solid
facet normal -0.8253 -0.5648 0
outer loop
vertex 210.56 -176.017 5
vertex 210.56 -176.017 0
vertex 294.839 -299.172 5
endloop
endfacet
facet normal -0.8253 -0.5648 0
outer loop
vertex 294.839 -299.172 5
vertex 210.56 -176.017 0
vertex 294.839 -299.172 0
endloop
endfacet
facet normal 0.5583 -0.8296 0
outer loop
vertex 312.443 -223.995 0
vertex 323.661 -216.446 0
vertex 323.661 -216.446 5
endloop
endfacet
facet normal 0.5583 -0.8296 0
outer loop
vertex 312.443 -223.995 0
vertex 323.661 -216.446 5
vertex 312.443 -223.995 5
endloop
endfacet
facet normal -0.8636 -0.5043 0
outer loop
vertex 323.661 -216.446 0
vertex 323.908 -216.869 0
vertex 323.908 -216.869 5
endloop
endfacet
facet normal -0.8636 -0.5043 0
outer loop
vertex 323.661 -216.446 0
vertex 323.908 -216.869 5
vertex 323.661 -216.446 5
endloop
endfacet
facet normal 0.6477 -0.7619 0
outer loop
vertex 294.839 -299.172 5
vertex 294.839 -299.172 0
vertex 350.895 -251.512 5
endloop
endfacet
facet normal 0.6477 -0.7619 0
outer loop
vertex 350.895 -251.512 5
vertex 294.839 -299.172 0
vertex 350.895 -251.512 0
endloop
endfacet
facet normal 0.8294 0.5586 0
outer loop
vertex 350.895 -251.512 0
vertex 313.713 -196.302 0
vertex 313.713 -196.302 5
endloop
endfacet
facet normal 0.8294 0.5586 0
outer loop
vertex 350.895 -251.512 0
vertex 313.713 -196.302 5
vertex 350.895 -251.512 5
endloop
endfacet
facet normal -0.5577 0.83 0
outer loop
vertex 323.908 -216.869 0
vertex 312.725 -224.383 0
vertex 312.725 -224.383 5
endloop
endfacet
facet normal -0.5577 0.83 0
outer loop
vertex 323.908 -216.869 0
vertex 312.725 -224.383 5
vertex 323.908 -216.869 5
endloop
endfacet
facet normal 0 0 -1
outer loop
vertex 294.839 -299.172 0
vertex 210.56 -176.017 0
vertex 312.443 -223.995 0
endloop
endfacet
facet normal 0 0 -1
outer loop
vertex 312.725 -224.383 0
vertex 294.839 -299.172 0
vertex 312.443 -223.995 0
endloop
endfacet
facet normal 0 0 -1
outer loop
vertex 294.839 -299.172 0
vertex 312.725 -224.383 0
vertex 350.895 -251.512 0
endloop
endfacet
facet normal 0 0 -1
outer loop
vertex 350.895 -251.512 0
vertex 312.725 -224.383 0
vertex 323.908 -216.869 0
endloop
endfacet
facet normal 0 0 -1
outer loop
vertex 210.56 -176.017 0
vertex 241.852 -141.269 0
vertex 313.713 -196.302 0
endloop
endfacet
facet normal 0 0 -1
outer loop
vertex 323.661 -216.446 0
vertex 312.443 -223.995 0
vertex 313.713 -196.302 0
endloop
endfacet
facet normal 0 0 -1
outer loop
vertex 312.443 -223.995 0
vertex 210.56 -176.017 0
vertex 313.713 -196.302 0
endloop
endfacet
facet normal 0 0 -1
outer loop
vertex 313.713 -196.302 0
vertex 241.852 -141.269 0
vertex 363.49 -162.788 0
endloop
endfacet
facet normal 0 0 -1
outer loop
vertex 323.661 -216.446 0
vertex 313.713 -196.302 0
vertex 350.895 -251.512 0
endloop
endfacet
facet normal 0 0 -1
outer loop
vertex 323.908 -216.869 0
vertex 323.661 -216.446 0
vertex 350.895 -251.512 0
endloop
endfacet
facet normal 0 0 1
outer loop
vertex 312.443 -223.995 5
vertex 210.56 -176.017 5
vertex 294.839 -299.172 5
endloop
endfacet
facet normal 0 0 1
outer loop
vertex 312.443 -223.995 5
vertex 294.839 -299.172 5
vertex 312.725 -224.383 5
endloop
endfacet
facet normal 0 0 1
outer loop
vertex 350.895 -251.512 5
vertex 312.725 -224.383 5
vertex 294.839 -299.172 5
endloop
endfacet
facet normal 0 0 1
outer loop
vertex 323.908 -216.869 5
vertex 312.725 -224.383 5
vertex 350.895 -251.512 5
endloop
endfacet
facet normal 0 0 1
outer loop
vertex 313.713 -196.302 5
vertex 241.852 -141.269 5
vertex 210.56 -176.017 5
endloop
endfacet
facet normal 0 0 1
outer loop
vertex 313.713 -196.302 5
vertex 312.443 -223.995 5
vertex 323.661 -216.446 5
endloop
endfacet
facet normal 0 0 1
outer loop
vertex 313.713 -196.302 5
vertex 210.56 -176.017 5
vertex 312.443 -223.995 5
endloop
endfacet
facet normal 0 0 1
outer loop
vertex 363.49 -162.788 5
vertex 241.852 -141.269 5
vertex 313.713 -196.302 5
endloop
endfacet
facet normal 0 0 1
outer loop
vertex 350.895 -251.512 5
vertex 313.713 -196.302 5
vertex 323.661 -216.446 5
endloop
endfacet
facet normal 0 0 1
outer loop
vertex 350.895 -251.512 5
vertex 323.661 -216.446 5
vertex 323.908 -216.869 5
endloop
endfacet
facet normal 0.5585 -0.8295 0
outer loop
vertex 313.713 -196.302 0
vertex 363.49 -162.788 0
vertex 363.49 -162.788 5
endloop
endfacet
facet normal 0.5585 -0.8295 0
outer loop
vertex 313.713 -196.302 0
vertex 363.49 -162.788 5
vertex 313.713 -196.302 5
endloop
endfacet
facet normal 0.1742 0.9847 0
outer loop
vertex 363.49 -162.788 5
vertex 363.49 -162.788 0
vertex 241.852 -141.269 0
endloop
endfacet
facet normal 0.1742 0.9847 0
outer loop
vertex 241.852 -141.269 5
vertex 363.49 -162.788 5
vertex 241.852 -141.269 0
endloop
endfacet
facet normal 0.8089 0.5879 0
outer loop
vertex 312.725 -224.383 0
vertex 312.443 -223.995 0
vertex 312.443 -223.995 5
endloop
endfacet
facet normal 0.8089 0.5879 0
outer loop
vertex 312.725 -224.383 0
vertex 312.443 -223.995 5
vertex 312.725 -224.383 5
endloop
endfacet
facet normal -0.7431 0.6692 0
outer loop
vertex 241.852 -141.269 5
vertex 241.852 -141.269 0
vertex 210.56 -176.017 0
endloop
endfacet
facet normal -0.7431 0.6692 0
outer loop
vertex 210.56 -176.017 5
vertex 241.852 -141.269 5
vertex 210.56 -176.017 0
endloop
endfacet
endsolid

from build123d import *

# Parameters (mm, degrees)
PAD003_DEPTH = 5


with BuildPart() as part:
    # Sketch003 → Pad003 (new body)
    with BuildSketch(Plane.XY):
        with BuildLine():
            add(Edge.make_bspline(
                [(363.489628, -162.788216), (241.851853, -141.268772)],
                knots=[0, 0, 350.154309, 350.154309], degree=1))
            add(Edge.make_bspline(
                [(363.489628, -162.788216), (313.712684, -196.302104)],
                knots=[0, 0, 170.100588, 170.100588], degree=1))
            add(Edge.make_bspline(
                [(313.712684, -196.302104), (350.895461, -251.511825)],
                knots=[0, 0, 188.683359, 188.683359], degree=1))
            add(Edge.make_bspline(
                [(294.839074, -299.172102), (350.895461, -251.511825)],
                knots=[0, 0, 208.569461, 208.569461], degree=1))
            add(Edge.make_bspline(
                [(210.560464, -176.017382), (294.839074, -299.172102)],
                knots=[0, 0, 423.017754, 423.017754], degree=1))
            add(Edge.make_bspline(
                [(241.851853, -141.268772), (210.560464, -176.017382)],
                knots=[0, 0, 132.55165, 132.55165], degree=1))
        make_face()
        with BuildLine():
            add(Edge.make_bspline(
                [(323.661017, -216.445715), (312.442684, -223.995159)],
                knots=[0, 0, 38.330145, 38.330145], degree=1))
            add(Edge.make_bspline(
                [(312.442684, -223.995159), (312.724907, -224.383215)],
                knots=[0, 0, 1.360147, 1.360147], degree=1))
            add(Edge.make_bspline(
                [(312.724907, -224.383215), (323.907962, -216.869048)],
                knots=[0, 0, 38.19136, 38.19136], degree=1))
            add(Edge.make_bspline(
                [(323.907962, -216.869048), (323.661017, -216.445715)],
                knots=[0, 0, 1.389244, 1.389244], degree=1))
        make_face(mode=Mode.SUBTRACT)
    extrude(amount=PAD003_DEPTH)


solid = part.part
